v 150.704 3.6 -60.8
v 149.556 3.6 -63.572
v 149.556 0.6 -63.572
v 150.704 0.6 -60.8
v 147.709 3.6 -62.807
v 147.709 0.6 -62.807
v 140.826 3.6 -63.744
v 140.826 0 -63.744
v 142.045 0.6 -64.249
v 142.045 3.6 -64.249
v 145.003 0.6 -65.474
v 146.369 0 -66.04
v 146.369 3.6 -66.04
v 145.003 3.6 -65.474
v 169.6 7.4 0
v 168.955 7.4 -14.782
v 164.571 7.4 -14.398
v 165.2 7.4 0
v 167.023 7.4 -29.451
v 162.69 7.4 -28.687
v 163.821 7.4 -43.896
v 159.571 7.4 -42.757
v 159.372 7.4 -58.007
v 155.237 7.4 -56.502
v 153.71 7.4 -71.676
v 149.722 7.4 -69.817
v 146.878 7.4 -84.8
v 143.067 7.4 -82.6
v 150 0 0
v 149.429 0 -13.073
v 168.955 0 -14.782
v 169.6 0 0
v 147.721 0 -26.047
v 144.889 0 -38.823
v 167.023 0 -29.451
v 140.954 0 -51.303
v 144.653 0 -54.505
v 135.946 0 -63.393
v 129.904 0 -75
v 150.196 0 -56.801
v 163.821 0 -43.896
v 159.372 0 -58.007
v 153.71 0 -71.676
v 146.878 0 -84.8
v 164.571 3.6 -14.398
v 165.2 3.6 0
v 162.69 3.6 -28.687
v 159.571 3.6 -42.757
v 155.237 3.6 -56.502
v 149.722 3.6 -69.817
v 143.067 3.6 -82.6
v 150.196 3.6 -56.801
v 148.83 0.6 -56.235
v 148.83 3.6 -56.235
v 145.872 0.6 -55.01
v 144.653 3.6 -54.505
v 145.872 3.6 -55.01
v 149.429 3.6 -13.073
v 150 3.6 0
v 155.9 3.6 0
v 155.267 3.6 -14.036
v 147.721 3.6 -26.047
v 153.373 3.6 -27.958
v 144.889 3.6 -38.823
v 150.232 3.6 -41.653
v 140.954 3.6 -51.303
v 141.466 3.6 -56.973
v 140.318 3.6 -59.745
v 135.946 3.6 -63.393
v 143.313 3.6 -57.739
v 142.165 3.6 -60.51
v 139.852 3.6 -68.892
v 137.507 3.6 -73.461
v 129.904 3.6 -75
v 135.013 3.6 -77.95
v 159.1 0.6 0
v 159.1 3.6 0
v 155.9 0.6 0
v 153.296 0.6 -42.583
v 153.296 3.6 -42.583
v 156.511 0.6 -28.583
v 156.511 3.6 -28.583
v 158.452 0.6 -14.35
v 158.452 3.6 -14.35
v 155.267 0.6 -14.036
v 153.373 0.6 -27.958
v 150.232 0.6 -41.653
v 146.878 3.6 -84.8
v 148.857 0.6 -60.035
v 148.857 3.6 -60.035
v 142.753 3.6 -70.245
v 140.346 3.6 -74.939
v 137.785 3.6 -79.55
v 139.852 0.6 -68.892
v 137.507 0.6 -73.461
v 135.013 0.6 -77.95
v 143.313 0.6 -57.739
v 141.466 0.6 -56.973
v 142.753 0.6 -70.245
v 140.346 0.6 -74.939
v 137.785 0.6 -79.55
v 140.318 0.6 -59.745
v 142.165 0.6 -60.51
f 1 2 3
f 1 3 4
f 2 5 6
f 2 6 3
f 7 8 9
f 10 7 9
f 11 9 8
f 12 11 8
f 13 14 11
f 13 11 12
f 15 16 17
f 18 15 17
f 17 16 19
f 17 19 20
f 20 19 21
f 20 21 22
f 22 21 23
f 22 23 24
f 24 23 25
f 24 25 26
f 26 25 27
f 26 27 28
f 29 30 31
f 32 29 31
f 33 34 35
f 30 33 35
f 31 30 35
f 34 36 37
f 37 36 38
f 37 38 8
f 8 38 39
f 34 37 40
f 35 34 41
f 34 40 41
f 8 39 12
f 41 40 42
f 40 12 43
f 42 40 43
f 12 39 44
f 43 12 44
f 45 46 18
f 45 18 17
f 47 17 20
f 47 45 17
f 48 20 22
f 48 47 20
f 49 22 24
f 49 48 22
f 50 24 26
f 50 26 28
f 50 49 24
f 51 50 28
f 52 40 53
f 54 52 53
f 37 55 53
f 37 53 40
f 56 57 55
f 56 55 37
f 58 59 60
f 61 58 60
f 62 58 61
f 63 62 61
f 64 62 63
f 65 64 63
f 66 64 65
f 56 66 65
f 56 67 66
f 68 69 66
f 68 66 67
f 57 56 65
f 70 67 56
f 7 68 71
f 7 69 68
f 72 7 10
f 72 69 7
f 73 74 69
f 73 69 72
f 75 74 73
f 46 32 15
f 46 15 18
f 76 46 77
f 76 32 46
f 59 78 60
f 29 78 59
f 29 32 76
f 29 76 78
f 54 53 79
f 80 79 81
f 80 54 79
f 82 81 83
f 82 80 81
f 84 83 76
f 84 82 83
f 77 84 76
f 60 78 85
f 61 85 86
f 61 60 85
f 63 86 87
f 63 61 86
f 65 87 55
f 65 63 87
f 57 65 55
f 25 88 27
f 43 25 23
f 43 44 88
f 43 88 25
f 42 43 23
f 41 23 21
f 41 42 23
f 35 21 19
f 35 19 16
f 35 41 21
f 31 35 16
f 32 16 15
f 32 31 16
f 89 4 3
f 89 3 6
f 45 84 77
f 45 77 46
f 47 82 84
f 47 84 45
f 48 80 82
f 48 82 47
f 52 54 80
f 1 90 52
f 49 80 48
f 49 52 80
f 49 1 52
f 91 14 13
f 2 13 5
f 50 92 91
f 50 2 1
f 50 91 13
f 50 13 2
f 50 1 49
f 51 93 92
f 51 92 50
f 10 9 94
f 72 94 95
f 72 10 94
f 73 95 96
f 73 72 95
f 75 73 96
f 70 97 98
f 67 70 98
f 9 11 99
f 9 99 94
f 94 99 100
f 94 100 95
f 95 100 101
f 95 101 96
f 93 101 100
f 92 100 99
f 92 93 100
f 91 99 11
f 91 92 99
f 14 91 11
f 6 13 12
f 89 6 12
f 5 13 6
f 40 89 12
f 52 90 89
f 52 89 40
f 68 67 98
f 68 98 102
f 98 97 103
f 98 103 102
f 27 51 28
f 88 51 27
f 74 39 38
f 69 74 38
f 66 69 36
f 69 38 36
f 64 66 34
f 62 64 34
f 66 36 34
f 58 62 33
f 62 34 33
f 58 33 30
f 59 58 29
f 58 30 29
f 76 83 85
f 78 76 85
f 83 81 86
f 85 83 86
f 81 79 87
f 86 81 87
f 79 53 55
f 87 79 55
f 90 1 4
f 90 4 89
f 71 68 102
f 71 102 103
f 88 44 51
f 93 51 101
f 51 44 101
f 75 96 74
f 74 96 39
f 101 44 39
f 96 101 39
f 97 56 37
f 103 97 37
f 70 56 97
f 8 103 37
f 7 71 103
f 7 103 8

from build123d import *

# Parameters (mm, degrees)
AUFSATZ_LINEAR_AUSTRAGEN1_DEPTH = 3.6
SCHNITT_LINEAR_AUSTRAGEN1_DEPTH = 3
SCHNITT_LINEAR_AUSTRAGEN2_DEPTH = 190.652735282
SCHNITT_LINEAR_AUSTRAGEN3_DEPTH = 3
AUFSATZ_LINEAR_AUSTRAGEN2_DEPTH = 3.8


with BuildPart() as part:
    # Skizze1 → Aufsatz-Linear austragen1 (new body)
    with BuildSketch(Plane(origin=(0, 0, 0), x_dir=(1, 0, 0), z_dir=(0, 1, 0))):
        with BuildLine():
            Line((146.877908482, 84.8), (129.903810568, 75))
            ThreePointArc((129.903810568, 75), (144.888873943, 38.822856765), (150, 0))
            Line((150, 0), (169.6, 0))
            ThreePointArc((169.6, 0), (163.821020139, 43.895710049), (146.877908482, 84.8))
        make_face()
    extrude(amount=AUFSATZ_LINEAR_AUSTRAGEN1_DEPTH)

    # Skizze2 → Schnitt-Linear austragen1 (cut)
    with BuildSketch(Plane(origin=(0, 3.6, 0), x_dir=(1, 0, 0), z_dir=(0, 1, 0))):
        with BuildLine():
            Line((135.01336045, 77.95), (137.784641742, 79.55))
            ThreePointArc((137.784641742, 79.55), (153.678798963, 41.178110076), (159.1, 0))
            Line((159.1, 0), (155.9, 0))
            ThreePointArc((155.9, 0), (150.587836318, 40.349889131), (135.01336045, 77.95))
        make_face()
    extrude(amount=-SCHNITT_LINEAR_AUSTRAGEN1_DEPTH, mode=Mode.SUBTRACT)

    # Skizze3 → Schnitt-Linear austragen2 (cut, through all)
    with BuildSketch(Plane(origin=(0, 3.6, 0), x_dir=(1, 0, 0), z_dir=(0, 1, 0))):
        Polygon((140.825970611, 63.743987963), (146.369247806, 66.040088557), (150.19608213, 56.801293232), (144.652804935, 54.505192638), align=None)
    extrude(amount=-SCHNITT_LINEAR_AUSTRAGEN2_DEPTH, mode=Mode.SUBTRACT)

    # Skizze4 → Schnitt-Linear austragen3 (cut)
    with BuildSketch(Plane(origin=(0, 3.6, 0), x_dir=(1, 0, 0), z_dir=(0, 1, 0))):
        Polygon((140.317603559, 59.745042734), (149.556398885, 63.571877058), (150.704449182, 60.800238461), (141.465653857, 56.973404137), align=None)
    extrude(amount=-SCHNITT_LINEAR_AUSTRAGEN3_DEPTH, mode=Mode.SUBTRACT)

    # Skizze5 → Aufsatz-Linear austragen2 (add)
    with BuildSketch(Plane(origin=(0, 3.6, 0), x_dir=(1, 0, 0), z_dir=(0, 1, 0))):
        with BuildLine():
            Line((143.067396705, 82.6), (146.877908482, 84.8))
            ThreePointArc((146.877908482, 84.8), (163.821020139, 43.895710049), (169.6, 0))
            Line((169.6, 0), (165.2, 0))
            ThreePointArc((165.2, 0), (159.570946503, 42.756906251), (143.067396705, 82.6))
        make_face()
    extrude(amount=AUFSATZ_LINEAR_AUSTRAGEN2_DEPTH)


solid = part.part
